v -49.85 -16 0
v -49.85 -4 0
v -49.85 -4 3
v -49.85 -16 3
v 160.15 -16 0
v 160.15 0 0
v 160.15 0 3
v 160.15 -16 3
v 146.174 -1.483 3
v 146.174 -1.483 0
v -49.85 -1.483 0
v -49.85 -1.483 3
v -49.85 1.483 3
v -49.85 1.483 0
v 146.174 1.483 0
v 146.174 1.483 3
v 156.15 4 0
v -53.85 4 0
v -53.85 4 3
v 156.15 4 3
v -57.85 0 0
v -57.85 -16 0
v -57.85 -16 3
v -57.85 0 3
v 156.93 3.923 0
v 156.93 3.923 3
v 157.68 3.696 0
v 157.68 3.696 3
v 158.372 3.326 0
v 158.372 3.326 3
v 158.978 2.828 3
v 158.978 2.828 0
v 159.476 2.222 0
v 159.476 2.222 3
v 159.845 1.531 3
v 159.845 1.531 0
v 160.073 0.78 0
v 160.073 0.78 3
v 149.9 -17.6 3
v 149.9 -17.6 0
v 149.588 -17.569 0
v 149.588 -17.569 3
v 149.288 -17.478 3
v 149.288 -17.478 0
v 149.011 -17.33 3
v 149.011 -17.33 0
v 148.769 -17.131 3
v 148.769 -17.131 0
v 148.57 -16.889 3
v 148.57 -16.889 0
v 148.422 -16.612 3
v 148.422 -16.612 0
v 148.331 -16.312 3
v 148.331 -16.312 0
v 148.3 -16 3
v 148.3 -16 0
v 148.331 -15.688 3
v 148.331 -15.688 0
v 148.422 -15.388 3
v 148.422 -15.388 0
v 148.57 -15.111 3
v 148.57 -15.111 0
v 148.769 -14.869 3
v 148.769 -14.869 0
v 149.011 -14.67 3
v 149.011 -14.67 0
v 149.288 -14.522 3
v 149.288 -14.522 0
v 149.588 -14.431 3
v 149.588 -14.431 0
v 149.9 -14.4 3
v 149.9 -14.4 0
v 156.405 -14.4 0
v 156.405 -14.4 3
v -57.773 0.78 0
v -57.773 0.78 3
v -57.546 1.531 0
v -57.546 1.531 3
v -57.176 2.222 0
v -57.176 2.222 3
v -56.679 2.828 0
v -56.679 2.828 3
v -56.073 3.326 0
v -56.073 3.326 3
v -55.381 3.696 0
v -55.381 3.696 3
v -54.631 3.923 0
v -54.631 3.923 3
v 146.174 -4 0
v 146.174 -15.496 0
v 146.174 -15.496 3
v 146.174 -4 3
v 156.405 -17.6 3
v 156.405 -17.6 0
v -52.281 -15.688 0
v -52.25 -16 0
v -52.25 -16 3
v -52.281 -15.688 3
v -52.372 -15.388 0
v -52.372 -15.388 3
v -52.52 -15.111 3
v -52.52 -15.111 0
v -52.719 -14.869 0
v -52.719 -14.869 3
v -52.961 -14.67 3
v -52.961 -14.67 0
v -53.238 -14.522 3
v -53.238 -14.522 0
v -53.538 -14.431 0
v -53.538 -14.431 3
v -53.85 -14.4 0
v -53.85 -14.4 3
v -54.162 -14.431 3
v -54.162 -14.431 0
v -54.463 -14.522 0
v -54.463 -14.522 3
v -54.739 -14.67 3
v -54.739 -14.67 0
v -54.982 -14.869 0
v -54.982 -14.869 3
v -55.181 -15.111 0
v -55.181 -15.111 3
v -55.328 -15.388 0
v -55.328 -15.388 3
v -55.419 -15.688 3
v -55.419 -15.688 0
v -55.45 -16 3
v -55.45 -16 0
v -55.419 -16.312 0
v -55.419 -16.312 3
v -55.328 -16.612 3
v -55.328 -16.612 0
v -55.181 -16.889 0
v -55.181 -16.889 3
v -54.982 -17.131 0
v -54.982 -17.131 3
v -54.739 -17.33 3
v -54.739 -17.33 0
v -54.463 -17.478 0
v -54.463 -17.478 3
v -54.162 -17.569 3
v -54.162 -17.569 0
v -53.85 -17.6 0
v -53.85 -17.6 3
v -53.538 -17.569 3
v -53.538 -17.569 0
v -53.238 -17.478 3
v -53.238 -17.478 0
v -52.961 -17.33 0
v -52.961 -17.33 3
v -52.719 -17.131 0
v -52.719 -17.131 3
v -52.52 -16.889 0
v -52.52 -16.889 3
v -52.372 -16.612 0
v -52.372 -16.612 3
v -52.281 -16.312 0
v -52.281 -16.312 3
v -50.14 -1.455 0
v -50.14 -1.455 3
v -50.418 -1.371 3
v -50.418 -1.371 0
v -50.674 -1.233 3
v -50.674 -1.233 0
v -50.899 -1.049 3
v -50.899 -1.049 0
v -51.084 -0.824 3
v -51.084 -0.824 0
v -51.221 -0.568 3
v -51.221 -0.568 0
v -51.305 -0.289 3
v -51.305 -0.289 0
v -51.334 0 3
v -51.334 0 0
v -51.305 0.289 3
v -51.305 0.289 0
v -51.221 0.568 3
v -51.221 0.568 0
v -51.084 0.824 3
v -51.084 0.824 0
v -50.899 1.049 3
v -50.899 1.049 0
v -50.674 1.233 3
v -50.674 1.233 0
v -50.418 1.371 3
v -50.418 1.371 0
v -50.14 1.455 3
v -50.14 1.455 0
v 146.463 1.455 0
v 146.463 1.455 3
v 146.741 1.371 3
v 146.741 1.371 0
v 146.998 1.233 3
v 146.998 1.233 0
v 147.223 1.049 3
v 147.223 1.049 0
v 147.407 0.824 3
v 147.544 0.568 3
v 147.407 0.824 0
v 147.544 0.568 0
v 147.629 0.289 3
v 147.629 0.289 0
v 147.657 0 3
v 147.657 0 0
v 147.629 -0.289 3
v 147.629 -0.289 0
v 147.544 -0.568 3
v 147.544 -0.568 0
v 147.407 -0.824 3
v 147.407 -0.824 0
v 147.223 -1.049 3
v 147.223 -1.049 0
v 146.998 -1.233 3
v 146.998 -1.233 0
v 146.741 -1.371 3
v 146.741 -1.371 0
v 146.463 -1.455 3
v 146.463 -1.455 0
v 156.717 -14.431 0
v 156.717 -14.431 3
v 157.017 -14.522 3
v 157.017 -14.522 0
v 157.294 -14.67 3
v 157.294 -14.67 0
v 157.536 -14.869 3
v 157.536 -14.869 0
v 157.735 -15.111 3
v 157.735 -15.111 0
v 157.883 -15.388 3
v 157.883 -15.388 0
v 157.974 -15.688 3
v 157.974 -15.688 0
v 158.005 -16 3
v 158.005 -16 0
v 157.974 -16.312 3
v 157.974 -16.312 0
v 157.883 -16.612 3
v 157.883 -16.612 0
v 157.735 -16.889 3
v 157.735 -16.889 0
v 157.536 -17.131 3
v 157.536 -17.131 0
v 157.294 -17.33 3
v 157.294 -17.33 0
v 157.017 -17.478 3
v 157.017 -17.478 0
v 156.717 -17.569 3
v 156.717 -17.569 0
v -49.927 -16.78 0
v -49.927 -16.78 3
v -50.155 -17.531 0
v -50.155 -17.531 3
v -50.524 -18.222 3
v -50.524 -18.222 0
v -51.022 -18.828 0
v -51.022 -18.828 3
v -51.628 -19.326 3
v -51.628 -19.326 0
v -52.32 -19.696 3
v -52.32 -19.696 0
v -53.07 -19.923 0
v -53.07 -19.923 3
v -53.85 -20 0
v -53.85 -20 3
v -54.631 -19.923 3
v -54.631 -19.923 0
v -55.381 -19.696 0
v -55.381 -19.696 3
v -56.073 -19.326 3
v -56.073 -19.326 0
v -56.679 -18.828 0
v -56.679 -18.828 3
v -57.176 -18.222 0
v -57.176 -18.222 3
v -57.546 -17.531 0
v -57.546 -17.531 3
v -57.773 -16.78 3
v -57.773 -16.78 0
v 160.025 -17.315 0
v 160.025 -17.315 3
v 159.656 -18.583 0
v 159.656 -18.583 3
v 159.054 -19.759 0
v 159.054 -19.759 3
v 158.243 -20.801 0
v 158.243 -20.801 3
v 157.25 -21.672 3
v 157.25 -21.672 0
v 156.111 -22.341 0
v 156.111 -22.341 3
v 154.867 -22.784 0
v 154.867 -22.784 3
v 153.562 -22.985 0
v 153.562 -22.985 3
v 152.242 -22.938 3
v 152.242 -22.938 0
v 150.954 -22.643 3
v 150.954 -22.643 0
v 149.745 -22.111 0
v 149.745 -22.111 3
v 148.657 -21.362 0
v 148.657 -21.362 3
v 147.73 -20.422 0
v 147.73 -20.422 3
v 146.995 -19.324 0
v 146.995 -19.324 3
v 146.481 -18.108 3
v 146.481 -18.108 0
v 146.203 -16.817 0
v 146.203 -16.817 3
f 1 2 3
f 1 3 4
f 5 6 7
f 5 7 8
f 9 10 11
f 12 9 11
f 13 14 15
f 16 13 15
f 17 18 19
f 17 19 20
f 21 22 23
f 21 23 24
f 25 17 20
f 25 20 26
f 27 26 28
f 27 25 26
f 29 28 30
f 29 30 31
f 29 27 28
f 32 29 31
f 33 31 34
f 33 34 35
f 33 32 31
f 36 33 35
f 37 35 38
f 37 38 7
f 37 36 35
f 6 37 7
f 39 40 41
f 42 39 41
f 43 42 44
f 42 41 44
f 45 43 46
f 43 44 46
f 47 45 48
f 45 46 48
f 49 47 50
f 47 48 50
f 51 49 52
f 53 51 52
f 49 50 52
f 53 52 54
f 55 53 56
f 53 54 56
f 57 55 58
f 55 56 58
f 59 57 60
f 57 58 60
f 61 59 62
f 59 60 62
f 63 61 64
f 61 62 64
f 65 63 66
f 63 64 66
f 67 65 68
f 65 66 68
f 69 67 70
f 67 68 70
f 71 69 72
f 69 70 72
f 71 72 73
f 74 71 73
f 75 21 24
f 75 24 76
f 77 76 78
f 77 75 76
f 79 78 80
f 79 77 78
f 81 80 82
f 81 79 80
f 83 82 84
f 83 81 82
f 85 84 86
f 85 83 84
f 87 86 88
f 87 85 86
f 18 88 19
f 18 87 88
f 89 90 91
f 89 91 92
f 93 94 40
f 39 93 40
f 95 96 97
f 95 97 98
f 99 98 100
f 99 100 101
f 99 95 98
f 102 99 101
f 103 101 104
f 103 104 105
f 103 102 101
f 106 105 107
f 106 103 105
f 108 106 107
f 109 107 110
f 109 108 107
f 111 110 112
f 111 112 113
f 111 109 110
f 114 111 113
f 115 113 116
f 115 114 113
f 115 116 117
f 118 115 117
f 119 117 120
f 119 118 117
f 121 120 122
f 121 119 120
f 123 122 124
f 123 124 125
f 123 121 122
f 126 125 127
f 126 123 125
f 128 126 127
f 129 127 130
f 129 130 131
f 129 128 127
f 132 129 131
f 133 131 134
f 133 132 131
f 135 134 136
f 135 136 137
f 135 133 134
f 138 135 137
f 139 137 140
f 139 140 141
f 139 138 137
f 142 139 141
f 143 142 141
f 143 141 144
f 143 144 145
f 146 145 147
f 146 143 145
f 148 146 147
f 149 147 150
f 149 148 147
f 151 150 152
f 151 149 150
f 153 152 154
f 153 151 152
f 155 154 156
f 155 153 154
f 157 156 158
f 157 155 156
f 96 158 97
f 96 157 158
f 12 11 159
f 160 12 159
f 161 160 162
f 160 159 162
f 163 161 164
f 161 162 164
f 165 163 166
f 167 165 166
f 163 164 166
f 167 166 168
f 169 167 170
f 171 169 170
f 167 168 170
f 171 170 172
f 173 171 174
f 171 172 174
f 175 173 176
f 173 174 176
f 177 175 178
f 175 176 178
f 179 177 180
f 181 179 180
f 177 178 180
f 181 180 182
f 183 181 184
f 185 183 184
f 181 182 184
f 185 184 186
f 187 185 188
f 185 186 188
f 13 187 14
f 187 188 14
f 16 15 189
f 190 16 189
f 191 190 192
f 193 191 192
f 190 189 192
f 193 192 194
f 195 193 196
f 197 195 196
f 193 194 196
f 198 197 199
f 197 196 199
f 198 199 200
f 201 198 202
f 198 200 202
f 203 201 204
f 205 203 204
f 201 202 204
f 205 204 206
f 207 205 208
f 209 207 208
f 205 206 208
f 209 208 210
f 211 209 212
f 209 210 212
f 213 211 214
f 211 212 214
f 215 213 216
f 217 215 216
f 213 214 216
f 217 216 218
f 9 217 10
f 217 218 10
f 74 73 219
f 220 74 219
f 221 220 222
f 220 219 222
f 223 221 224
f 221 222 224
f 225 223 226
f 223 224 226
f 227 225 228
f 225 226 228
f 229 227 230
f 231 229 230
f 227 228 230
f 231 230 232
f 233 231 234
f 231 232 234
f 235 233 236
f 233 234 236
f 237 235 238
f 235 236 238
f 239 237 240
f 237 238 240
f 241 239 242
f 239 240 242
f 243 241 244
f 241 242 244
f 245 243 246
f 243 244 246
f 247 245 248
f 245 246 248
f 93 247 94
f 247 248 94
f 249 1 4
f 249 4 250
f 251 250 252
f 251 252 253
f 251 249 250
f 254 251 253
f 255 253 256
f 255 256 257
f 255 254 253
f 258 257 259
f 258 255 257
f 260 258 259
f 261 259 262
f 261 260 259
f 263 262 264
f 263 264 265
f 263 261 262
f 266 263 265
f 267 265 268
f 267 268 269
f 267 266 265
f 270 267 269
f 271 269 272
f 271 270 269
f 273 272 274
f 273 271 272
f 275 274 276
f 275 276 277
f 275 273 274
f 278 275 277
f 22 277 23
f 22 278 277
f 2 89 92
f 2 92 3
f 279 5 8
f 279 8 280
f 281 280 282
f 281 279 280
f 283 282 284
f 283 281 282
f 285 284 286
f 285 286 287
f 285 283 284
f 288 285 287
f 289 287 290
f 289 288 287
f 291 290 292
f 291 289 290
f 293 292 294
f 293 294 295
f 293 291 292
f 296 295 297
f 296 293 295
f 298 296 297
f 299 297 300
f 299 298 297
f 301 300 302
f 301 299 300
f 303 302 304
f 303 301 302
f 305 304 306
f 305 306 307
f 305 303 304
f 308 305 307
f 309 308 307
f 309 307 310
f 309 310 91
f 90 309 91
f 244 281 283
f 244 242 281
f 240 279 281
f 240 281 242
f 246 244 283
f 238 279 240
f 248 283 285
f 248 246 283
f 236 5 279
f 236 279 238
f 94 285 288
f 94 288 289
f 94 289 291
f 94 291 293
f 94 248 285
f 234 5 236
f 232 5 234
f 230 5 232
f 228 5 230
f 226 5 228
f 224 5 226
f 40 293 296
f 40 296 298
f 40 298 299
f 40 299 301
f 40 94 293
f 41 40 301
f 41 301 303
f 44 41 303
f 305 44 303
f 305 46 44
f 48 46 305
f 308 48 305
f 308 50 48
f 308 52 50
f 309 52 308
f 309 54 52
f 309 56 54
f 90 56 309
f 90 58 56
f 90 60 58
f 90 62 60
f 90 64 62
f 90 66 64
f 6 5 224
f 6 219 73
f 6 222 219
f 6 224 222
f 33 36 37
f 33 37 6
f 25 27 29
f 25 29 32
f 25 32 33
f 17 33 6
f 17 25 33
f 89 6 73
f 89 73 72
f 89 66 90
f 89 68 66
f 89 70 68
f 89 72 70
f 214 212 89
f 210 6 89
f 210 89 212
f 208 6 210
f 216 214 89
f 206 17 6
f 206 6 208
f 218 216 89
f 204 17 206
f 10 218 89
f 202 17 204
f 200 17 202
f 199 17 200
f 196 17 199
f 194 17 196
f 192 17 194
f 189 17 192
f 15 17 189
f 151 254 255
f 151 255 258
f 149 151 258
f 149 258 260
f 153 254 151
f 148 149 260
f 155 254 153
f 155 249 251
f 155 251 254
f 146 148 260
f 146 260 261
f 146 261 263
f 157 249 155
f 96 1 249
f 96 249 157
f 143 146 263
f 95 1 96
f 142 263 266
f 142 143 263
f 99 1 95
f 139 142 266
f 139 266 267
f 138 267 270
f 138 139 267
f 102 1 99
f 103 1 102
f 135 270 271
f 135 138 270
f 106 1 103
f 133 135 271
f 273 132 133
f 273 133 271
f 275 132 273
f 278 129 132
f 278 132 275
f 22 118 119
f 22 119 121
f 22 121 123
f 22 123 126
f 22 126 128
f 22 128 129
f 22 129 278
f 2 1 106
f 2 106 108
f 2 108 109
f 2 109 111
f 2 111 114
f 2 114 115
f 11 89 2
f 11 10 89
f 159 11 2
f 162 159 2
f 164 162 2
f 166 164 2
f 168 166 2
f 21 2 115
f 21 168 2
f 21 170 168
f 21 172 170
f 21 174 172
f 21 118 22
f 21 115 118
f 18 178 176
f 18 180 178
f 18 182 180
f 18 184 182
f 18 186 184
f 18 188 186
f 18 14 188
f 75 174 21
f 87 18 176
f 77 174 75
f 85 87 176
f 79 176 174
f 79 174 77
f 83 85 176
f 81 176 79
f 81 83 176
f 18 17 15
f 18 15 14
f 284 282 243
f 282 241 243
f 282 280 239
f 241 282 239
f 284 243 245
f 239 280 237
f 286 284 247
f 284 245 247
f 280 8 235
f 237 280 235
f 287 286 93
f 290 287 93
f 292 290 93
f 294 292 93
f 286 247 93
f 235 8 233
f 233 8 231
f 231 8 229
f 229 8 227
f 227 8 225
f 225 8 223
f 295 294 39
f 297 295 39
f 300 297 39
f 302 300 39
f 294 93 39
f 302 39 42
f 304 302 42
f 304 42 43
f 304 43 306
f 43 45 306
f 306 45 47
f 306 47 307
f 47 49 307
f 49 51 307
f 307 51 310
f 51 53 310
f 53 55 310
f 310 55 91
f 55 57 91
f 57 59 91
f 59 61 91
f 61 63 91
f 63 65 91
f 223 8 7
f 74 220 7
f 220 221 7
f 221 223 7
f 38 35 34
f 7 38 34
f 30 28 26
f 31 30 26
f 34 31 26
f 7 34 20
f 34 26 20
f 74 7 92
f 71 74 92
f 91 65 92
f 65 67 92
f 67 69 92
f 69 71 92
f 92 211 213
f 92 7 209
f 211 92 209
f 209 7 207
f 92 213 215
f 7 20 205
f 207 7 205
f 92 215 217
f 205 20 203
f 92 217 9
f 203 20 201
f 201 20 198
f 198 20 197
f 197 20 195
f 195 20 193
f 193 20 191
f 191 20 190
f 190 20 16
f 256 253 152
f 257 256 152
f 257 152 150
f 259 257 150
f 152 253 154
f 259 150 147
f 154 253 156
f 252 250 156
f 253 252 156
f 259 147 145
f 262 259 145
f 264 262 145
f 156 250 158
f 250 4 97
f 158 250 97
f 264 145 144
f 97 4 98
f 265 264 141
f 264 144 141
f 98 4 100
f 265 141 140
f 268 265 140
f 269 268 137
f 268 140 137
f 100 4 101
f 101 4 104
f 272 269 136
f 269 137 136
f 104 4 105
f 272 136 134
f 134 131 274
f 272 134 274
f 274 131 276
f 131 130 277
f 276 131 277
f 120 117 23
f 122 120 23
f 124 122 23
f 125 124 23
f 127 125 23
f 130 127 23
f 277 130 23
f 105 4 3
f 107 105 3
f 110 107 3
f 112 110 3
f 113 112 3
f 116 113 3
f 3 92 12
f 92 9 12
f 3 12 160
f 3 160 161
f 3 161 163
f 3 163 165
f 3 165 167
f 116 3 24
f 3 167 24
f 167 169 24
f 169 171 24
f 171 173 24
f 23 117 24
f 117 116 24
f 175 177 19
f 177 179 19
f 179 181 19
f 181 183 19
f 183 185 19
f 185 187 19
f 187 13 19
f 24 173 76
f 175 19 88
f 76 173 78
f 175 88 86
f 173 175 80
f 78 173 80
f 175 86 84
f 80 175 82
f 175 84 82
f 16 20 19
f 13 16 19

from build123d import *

# Parameters (mm, degrees)
SKETCH_1_R      = 1.6
EXTRUDE_1_DEPTH = 3


with BuildPart() as part:
    # 草图1 → 凸台-拉伸1 (new body)
    with BuildSketch(Plane.XY):
        with BuildLine():
            Line((-53.850242828, 4), (156.149757172, 4))
            ThreePointArc((156.149757172, 4), (158.978184297, 2.828427125), (160.149757172, 0))
            Line((160.149757172, 0), (160.149757172, -16))
            ThreePointArc((160.149757172, -16), (152.900492864, -22.992597394), (146.173644012, -15.496081147))
            Line((146.173644012, -15.496081147), (146.173644012, -4))
            Line((146.173644012, -4), (-49.850242828, -4))
            Line((-49.850242828, -4), (-49.850242828, -16))
            ThreePointArc((-49.850242828, -16), (-53.850242828, -20), (-57.850242828, -16))
            Line((-57.850242828, -16), (-57.850242828, 0))
            ThreePointArc((-57.850242828, 0), (-56.678669953, 2.828427125), (-53.850242828, 4))
        make_face()
        with Locations((-53.850242828, -16)):
            Circle(SKETCH_1_R, mode=Mode.SUBTRACT)
        with BuildLine():
            Line((-49.850242828, 1.483471582), (146.173644012, 1.483471582))
            ThreePointArc((146.173644012, 1.483471582), (147.657115594, 0), (146.173644012, -1.483471582))
            Line((146.173644012, -1.483471582), (-49.850242828, -1.483471582))
            ThreePointArc((-49.850242828, -1.483471582), (-51.33371441, 0), (-49.850242828, 1.483471582))
        make_face(mode=Mode.SUBTRACT)
        with BuildLine():
            Line((149.900261056, -14.4), (156.40497097, -14.4))
            ThreePointArc((156.40497097, -14.4), (158.00497097, -16), (156.40497097, -17.6))
            Line((156.40497097, -17.6), (149.900261056, -17.6))
            ThreePointArc((149.900261056, -17.6), (148.300261056, -16), (149.900261056, -14.4))
        make_face(mode=Mode.SUBTRACT)
    extrude(amount=EXTRUDE_1_DEPTH)


solid = part.part
